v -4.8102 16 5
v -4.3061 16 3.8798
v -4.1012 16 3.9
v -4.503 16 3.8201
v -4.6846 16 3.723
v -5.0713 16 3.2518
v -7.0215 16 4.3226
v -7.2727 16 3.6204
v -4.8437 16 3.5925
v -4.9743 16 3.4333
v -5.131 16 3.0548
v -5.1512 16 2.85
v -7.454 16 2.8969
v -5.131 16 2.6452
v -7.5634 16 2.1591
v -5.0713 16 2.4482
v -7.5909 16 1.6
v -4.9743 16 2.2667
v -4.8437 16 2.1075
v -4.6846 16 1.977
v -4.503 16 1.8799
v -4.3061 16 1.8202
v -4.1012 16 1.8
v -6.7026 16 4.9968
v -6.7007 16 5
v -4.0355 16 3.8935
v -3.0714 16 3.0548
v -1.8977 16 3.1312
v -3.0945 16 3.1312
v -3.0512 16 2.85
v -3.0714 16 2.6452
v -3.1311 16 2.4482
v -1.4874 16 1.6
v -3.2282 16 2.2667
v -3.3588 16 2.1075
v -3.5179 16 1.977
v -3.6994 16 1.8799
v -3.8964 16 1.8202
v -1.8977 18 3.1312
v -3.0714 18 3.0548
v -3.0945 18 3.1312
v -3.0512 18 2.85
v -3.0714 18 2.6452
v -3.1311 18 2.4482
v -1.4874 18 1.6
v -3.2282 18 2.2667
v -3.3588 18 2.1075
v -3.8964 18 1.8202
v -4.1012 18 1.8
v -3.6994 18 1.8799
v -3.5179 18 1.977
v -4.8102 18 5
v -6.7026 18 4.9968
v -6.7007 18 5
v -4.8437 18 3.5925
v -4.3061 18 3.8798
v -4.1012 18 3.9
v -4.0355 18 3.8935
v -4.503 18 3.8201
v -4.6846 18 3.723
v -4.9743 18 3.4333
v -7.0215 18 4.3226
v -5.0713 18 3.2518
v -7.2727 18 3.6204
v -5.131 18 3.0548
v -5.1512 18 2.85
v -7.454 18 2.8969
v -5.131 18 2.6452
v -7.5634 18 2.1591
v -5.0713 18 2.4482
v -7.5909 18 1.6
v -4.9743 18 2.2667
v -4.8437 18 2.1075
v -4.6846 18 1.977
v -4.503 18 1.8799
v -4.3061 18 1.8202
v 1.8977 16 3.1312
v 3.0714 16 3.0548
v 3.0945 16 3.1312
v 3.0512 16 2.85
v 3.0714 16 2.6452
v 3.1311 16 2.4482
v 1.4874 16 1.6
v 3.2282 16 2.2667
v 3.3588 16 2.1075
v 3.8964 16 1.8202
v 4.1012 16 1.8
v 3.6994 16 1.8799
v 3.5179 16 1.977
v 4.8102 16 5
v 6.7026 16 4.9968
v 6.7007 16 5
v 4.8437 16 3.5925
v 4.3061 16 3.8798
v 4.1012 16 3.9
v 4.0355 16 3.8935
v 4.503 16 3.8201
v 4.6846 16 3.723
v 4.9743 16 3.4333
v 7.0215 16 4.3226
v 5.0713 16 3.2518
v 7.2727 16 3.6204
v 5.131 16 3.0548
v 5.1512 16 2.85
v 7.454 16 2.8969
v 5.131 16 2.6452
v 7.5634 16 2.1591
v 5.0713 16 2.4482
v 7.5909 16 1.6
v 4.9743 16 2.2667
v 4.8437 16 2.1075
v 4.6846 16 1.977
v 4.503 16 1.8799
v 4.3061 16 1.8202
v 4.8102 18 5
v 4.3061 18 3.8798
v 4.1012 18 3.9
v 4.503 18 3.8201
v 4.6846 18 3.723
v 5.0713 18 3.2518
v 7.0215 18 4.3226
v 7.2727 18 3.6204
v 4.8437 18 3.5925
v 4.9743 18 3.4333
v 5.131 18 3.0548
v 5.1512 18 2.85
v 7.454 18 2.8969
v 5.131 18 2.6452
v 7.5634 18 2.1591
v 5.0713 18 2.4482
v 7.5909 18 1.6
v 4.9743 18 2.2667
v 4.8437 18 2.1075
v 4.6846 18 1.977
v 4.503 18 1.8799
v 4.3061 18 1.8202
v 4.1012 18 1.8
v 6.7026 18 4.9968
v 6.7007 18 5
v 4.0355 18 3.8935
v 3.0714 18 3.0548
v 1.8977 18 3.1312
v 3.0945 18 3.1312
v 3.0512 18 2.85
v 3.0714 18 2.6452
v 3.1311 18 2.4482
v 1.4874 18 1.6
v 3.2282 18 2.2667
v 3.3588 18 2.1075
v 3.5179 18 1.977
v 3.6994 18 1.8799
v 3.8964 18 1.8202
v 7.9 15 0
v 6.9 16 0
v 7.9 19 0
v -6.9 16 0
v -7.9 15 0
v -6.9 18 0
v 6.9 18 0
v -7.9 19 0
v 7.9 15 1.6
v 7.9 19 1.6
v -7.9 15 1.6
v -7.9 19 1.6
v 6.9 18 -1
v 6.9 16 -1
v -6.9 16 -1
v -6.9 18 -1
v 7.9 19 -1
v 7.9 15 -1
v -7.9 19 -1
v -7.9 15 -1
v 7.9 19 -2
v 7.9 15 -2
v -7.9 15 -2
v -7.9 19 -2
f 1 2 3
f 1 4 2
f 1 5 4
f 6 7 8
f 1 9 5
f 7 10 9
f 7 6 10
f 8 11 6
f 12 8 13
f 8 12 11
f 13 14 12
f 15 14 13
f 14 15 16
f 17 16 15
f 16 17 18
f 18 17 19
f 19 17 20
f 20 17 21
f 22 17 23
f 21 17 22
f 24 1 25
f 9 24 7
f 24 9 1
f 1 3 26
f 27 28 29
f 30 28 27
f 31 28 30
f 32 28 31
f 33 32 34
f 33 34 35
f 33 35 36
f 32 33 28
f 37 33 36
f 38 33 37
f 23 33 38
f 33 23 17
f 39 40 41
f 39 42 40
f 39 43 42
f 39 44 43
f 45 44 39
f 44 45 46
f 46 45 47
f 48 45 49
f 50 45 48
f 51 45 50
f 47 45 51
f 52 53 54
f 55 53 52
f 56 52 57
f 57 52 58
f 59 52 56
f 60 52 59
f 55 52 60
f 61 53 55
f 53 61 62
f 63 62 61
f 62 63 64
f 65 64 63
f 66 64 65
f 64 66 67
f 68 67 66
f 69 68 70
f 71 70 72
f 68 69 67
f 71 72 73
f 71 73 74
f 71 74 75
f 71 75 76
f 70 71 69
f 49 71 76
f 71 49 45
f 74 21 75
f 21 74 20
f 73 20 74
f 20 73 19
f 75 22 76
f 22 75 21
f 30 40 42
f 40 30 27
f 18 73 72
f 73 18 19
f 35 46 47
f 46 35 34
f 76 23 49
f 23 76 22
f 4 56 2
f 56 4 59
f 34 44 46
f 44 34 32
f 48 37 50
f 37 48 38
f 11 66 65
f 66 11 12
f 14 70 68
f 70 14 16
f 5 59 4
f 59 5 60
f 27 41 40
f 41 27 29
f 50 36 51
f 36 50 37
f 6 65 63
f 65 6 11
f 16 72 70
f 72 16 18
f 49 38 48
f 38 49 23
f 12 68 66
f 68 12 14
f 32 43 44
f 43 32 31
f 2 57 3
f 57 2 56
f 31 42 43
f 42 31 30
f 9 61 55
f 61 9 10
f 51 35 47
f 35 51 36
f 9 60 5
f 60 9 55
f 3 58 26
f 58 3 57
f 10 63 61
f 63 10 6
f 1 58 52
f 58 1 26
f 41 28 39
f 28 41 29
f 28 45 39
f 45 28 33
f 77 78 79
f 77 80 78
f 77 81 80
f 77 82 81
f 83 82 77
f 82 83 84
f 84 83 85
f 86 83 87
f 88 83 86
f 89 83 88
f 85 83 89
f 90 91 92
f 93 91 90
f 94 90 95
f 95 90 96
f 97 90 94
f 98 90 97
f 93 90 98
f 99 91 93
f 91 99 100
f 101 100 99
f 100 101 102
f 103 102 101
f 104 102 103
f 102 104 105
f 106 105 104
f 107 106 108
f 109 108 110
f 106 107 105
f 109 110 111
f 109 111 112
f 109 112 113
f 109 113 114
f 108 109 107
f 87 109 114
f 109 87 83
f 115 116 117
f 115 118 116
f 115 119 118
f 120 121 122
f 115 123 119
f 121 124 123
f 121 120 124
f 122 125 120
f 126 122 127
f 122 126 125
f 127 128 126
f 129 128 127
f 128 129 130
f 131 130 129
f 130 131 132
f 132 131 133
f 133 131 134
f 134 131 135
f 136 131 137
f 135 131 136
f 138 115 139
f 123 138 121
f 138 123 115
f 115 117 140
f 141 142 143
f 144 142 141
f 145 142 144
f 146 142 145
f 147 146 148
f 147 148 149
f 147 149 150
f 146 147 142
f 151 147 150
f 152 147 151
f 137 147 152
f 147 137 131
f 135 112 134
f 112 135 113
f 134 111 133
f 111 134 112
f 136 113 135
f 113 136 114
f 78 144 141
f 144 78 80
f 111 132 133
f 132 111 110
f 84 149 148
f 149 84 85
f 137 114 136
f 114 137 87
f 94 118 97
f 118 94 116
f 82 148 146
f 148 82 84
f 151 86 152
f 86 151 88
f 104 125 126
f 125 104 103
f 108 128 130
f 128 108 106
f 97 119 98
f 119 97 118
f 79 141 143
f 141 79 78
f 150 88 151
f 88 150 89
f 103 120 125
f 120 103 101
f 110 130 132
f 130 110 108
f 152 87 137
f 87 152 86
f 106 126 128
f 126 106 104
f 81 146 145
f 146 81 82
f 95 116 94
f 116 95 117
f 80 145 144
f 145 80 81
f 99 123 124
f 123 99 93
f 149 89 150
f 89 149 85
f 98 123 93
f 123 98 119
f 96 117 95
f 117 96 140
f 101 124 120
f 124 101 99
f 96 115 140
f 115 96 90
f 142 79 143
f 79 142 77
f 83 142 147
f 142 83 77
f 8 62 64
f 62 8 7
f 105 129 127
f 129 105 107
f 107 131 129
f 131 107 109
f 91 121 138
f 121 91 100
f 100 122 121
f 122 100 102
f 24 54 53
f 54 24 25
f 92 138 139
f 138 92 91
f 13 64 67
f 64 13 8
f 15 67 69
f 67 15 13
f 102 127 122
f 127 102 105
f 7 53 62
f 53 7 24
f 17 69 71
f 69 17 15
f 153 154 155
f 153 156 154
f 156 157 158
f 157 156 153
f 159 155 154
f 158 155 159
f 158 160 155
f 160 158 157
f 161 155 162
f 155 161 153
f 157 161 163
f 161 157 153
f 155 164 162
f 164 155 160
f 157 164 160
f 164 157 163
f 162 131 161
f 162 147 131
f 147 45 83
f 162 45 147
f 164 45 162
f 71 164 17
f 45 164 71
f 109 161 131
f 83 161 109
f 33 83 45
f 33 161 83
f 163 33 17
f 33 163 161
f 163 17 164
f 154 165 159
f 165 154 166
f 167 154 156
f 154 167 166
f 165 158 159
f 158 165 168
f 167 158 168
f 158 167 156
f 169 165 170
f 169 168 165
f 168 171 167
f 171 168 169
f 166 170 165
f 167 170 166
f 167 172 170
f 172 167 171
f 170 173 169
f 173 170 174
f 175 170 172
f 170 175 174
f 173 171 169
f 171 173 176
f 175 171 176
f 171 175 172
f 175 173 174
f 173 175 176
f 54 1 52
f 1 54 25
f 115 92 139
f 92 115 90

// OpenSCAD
DEBUG_LAYER = 10;
WIRE_DIAMETER = 2;
WIRE_RADIUS = WIRE_DIAMETER / 2;
MARBLE_DIAMETER = 9.5;
MARBLE_RADIUS = MARBLE_DIAMETER / 2;
HOLDER_WIDTH = 1.5;
DEFAULT_SPACE_OFFSET = 1.1;
DEFAULT_HEIGHT = 2;
SQRT22 = sqrt(2) / 2;

module tube(inner, outer, h = DEFAULT_HEIGHT, $fn = 32) {
    in = min(outer, inner);
    out = max(outer, inner);
    
    difference() {
        cylinder(h, out, out, $fn);
        translate([0, 0, -1]) 
            cylinder(h+2, in, in,  $fn);
    };
}

module rtCylinder(radius, posX, rotate, isTrim = false, h = DEFAULT_HEIGHT, $fn = 32, $posY = 0, $innerRotation = 0) {    
    rotate(rotate) {
        if (isTrim) {            
            translate([posX, $posY, -1])
                rotate($innerRotation)
                    cylinder(h + 2, radius, radius, $fn = $fn);
        } else {
            translate([posX, $posY, 0])
                rotate($innerRotation)
                    cylinder(h, radius, radius, $fn = $fn);
        }        
    }; 
}

module rtCube(width, length, posX, rotate, isTrim = false, h = DEFAULT_HEIGHT, $center = false, $posY = 0) {
    translateZ = $center ? h / 2 : isTrim ? -1 : 0;
    height = isTrim ? h + 2 : h;
    
    rotate(rotate)
        translate([posX, $posY, translateZ])
            cube([width, length, height], center = $center);
}



module wireHolder(scale = 1, rotate = -135, width = 1, h = DEFAULT_HEIGHT) {
    wireRadius = WIRE_RADIUS * scale;
    
    difference() {
        rotate([0, 0, rotate])
            translate([MARBLE_RADIUS + wireRadius, 0, 0]) {
                cutSide = wireRadius * 3;
                
                difference() {   
                    tube(wireRadius, cutSide * 1.1, h);
                                        
                    rtCube(cutSide, cutSide, -wireRadius * 2 * SQRT22, 80, true, h, $center = true, $posY = cutSide * SQRT22);                rtCube(cutSide, cutSide, -wireRadius * 2.5 * SQRT22, 45, true, h, $center = true, $posY = cutSide * SQRT22);        

                    rtCube(
                        MARBLE_RADIUS * 2, 
                        MARBLE_RADIUS * .8, 
                        -wireRadius, 
                        60, 
                        true, 
                        h, 
                        $center = true, 
                        $posY = (wireRadius * SQRT22) + (MARBLE_RADIUS * SQRT22)
                    );                
                }
                
        }
    }
   
    translate([MARBLE_RADIUS + (wireRadius * 2.2), 0, 0])
        rtCylinder(wireRadius * 3, wireRadius * 3, rotate - 15, 0, $fn = 3, $posY = (wireRadius * 7.4 * (sqrt(2) / 2)));
}

module base(holderOffset, scale = 1, h = DEFAULT_HEIGHT) {
    wireRadius = WIRE_RADIUS * scale;
    
    difference() {
        rtCube(
            MARBLE_DIAMETER * 1.25, 
            h, 
            -MARBLE_RADIUS * 1.25,
            0,
            false,
            h,
            $posY = -holderOffset - (DEFAULT_HEIGHT * .9)
        );


        rotate([0, 0, -45])
            translate([MARBLE_RADIUS + wireRadius, 0, -2])
                cylinder(h + 4, wireRadius, wireRadius, $fn=32); 
        
        rotate([0, 0, -135])
            translate([MARBLE_RADIUS + wireRadius, 0, -2])
                cylinder(h + 4, wireRadius, wireRadius, $fn=32); 
                    
    }
}

module bracket(scale = 1, h = DEFAULT_HEIGHT) {
    wireRadius = WIRE_RADIUS * scale;
    holderOffset = ((MARBLE_RADIUS + wireRadius) * sqrt(2) / 2) + wireRadius;

    translate([0, 0, holderOffset + DEFAULT_HEIGHT * .9]) 
        rotate([90, 0, 0])  {
            // FULL BASE    
            difference() {
                union() {
                    wireHolder(scale);
                    mirror([90, 0, 0])
                        wireHolder(scale);
                   
                   *base(holderOffset, scale, h);
                    

                    *color("#ff0000") {
                        circle(MARBLE_RADIUS, $fn=32);
                        
                        rotate([0, 0, -135])
                            translate([MARBLE_RADIUS + WIRE_RADIUS, 0, -1])
                                circle(WIRE_RADIUS, $fn=32); 
                        
                        rotate([0, 0, -45])
                            translate([MARBLE_RADIUS + WIRE_RADIUS, 0, -1])
                                circle(WIRE_RADIUS, $fn=32); 
                    }
                    
                }               
            }      
    }
}



baseScale = 1;
spacing = 1.5;
lastY = 0;

for(s = [1:1:1]) {
    gap = (DEFAULT_HEIGHT * baseScale) + (spacing + (s * 1));
    translateY = (s * 3) * (lastY + gap);
    lastY = translateY;

    for(i = [1:1:1]) { 
        theScale = baseScale + (i * .05);
        baseWidth = MARBLE_DIAMETER + (WIRE_RADIUS * theScale * 3 * 2);
        
        for(j = [1:1:1]) { 
            translate([0, translateY + (gap * j), 0]) {
                difference() {
                    union() {
                        difference() {

                            bracket(theScale);
                           
                            translate([0, 0, -2]) rtCube(20, 10, 0, 0, $center = true);
                            
                            rotate([90, 0, 0])
                                translate([0, 2 * SQRT22, -1])
                                    tube(MARBLE_RADIUS * 1.6, MARBLE_DIAMETER * 2, (DEFAULT_HEIGHT * theScale) + 2, $fn = 64);
                       }
                       

                        translate([-baseWidth / 2, 1, 0])
                            rotate([90, 0, 0]) {
                                rtCube(baseWidth, WIRE_DIAMETER * .8, 0, 0, h = DEFAULT_HEIGHT + 2);
                                translate([1, -1, 1])
                                    rtCube(baseWidth - 2, 1, 0, 0, h = DEFAULT_HEIGHT);
                                translate([0, -2, 0])
                                    rtCube(baseWidth, 1, 0, 0, h = DEFAULT_HEIGHT + 2);
                            }
                    } 
              
                    translate([-MARBLE_DIAMETER, -DEFAULT_HEIGHT - 1, WIRE_DIAMETER * 2 + 1])
                        rtCube(MARBLE_DIAMETER * 2, DEFAULT_HEIGHT + 2, 0, 0, h = WIRE_DIAMETER * 2);  
                }
            }
            
        }
    }
}
